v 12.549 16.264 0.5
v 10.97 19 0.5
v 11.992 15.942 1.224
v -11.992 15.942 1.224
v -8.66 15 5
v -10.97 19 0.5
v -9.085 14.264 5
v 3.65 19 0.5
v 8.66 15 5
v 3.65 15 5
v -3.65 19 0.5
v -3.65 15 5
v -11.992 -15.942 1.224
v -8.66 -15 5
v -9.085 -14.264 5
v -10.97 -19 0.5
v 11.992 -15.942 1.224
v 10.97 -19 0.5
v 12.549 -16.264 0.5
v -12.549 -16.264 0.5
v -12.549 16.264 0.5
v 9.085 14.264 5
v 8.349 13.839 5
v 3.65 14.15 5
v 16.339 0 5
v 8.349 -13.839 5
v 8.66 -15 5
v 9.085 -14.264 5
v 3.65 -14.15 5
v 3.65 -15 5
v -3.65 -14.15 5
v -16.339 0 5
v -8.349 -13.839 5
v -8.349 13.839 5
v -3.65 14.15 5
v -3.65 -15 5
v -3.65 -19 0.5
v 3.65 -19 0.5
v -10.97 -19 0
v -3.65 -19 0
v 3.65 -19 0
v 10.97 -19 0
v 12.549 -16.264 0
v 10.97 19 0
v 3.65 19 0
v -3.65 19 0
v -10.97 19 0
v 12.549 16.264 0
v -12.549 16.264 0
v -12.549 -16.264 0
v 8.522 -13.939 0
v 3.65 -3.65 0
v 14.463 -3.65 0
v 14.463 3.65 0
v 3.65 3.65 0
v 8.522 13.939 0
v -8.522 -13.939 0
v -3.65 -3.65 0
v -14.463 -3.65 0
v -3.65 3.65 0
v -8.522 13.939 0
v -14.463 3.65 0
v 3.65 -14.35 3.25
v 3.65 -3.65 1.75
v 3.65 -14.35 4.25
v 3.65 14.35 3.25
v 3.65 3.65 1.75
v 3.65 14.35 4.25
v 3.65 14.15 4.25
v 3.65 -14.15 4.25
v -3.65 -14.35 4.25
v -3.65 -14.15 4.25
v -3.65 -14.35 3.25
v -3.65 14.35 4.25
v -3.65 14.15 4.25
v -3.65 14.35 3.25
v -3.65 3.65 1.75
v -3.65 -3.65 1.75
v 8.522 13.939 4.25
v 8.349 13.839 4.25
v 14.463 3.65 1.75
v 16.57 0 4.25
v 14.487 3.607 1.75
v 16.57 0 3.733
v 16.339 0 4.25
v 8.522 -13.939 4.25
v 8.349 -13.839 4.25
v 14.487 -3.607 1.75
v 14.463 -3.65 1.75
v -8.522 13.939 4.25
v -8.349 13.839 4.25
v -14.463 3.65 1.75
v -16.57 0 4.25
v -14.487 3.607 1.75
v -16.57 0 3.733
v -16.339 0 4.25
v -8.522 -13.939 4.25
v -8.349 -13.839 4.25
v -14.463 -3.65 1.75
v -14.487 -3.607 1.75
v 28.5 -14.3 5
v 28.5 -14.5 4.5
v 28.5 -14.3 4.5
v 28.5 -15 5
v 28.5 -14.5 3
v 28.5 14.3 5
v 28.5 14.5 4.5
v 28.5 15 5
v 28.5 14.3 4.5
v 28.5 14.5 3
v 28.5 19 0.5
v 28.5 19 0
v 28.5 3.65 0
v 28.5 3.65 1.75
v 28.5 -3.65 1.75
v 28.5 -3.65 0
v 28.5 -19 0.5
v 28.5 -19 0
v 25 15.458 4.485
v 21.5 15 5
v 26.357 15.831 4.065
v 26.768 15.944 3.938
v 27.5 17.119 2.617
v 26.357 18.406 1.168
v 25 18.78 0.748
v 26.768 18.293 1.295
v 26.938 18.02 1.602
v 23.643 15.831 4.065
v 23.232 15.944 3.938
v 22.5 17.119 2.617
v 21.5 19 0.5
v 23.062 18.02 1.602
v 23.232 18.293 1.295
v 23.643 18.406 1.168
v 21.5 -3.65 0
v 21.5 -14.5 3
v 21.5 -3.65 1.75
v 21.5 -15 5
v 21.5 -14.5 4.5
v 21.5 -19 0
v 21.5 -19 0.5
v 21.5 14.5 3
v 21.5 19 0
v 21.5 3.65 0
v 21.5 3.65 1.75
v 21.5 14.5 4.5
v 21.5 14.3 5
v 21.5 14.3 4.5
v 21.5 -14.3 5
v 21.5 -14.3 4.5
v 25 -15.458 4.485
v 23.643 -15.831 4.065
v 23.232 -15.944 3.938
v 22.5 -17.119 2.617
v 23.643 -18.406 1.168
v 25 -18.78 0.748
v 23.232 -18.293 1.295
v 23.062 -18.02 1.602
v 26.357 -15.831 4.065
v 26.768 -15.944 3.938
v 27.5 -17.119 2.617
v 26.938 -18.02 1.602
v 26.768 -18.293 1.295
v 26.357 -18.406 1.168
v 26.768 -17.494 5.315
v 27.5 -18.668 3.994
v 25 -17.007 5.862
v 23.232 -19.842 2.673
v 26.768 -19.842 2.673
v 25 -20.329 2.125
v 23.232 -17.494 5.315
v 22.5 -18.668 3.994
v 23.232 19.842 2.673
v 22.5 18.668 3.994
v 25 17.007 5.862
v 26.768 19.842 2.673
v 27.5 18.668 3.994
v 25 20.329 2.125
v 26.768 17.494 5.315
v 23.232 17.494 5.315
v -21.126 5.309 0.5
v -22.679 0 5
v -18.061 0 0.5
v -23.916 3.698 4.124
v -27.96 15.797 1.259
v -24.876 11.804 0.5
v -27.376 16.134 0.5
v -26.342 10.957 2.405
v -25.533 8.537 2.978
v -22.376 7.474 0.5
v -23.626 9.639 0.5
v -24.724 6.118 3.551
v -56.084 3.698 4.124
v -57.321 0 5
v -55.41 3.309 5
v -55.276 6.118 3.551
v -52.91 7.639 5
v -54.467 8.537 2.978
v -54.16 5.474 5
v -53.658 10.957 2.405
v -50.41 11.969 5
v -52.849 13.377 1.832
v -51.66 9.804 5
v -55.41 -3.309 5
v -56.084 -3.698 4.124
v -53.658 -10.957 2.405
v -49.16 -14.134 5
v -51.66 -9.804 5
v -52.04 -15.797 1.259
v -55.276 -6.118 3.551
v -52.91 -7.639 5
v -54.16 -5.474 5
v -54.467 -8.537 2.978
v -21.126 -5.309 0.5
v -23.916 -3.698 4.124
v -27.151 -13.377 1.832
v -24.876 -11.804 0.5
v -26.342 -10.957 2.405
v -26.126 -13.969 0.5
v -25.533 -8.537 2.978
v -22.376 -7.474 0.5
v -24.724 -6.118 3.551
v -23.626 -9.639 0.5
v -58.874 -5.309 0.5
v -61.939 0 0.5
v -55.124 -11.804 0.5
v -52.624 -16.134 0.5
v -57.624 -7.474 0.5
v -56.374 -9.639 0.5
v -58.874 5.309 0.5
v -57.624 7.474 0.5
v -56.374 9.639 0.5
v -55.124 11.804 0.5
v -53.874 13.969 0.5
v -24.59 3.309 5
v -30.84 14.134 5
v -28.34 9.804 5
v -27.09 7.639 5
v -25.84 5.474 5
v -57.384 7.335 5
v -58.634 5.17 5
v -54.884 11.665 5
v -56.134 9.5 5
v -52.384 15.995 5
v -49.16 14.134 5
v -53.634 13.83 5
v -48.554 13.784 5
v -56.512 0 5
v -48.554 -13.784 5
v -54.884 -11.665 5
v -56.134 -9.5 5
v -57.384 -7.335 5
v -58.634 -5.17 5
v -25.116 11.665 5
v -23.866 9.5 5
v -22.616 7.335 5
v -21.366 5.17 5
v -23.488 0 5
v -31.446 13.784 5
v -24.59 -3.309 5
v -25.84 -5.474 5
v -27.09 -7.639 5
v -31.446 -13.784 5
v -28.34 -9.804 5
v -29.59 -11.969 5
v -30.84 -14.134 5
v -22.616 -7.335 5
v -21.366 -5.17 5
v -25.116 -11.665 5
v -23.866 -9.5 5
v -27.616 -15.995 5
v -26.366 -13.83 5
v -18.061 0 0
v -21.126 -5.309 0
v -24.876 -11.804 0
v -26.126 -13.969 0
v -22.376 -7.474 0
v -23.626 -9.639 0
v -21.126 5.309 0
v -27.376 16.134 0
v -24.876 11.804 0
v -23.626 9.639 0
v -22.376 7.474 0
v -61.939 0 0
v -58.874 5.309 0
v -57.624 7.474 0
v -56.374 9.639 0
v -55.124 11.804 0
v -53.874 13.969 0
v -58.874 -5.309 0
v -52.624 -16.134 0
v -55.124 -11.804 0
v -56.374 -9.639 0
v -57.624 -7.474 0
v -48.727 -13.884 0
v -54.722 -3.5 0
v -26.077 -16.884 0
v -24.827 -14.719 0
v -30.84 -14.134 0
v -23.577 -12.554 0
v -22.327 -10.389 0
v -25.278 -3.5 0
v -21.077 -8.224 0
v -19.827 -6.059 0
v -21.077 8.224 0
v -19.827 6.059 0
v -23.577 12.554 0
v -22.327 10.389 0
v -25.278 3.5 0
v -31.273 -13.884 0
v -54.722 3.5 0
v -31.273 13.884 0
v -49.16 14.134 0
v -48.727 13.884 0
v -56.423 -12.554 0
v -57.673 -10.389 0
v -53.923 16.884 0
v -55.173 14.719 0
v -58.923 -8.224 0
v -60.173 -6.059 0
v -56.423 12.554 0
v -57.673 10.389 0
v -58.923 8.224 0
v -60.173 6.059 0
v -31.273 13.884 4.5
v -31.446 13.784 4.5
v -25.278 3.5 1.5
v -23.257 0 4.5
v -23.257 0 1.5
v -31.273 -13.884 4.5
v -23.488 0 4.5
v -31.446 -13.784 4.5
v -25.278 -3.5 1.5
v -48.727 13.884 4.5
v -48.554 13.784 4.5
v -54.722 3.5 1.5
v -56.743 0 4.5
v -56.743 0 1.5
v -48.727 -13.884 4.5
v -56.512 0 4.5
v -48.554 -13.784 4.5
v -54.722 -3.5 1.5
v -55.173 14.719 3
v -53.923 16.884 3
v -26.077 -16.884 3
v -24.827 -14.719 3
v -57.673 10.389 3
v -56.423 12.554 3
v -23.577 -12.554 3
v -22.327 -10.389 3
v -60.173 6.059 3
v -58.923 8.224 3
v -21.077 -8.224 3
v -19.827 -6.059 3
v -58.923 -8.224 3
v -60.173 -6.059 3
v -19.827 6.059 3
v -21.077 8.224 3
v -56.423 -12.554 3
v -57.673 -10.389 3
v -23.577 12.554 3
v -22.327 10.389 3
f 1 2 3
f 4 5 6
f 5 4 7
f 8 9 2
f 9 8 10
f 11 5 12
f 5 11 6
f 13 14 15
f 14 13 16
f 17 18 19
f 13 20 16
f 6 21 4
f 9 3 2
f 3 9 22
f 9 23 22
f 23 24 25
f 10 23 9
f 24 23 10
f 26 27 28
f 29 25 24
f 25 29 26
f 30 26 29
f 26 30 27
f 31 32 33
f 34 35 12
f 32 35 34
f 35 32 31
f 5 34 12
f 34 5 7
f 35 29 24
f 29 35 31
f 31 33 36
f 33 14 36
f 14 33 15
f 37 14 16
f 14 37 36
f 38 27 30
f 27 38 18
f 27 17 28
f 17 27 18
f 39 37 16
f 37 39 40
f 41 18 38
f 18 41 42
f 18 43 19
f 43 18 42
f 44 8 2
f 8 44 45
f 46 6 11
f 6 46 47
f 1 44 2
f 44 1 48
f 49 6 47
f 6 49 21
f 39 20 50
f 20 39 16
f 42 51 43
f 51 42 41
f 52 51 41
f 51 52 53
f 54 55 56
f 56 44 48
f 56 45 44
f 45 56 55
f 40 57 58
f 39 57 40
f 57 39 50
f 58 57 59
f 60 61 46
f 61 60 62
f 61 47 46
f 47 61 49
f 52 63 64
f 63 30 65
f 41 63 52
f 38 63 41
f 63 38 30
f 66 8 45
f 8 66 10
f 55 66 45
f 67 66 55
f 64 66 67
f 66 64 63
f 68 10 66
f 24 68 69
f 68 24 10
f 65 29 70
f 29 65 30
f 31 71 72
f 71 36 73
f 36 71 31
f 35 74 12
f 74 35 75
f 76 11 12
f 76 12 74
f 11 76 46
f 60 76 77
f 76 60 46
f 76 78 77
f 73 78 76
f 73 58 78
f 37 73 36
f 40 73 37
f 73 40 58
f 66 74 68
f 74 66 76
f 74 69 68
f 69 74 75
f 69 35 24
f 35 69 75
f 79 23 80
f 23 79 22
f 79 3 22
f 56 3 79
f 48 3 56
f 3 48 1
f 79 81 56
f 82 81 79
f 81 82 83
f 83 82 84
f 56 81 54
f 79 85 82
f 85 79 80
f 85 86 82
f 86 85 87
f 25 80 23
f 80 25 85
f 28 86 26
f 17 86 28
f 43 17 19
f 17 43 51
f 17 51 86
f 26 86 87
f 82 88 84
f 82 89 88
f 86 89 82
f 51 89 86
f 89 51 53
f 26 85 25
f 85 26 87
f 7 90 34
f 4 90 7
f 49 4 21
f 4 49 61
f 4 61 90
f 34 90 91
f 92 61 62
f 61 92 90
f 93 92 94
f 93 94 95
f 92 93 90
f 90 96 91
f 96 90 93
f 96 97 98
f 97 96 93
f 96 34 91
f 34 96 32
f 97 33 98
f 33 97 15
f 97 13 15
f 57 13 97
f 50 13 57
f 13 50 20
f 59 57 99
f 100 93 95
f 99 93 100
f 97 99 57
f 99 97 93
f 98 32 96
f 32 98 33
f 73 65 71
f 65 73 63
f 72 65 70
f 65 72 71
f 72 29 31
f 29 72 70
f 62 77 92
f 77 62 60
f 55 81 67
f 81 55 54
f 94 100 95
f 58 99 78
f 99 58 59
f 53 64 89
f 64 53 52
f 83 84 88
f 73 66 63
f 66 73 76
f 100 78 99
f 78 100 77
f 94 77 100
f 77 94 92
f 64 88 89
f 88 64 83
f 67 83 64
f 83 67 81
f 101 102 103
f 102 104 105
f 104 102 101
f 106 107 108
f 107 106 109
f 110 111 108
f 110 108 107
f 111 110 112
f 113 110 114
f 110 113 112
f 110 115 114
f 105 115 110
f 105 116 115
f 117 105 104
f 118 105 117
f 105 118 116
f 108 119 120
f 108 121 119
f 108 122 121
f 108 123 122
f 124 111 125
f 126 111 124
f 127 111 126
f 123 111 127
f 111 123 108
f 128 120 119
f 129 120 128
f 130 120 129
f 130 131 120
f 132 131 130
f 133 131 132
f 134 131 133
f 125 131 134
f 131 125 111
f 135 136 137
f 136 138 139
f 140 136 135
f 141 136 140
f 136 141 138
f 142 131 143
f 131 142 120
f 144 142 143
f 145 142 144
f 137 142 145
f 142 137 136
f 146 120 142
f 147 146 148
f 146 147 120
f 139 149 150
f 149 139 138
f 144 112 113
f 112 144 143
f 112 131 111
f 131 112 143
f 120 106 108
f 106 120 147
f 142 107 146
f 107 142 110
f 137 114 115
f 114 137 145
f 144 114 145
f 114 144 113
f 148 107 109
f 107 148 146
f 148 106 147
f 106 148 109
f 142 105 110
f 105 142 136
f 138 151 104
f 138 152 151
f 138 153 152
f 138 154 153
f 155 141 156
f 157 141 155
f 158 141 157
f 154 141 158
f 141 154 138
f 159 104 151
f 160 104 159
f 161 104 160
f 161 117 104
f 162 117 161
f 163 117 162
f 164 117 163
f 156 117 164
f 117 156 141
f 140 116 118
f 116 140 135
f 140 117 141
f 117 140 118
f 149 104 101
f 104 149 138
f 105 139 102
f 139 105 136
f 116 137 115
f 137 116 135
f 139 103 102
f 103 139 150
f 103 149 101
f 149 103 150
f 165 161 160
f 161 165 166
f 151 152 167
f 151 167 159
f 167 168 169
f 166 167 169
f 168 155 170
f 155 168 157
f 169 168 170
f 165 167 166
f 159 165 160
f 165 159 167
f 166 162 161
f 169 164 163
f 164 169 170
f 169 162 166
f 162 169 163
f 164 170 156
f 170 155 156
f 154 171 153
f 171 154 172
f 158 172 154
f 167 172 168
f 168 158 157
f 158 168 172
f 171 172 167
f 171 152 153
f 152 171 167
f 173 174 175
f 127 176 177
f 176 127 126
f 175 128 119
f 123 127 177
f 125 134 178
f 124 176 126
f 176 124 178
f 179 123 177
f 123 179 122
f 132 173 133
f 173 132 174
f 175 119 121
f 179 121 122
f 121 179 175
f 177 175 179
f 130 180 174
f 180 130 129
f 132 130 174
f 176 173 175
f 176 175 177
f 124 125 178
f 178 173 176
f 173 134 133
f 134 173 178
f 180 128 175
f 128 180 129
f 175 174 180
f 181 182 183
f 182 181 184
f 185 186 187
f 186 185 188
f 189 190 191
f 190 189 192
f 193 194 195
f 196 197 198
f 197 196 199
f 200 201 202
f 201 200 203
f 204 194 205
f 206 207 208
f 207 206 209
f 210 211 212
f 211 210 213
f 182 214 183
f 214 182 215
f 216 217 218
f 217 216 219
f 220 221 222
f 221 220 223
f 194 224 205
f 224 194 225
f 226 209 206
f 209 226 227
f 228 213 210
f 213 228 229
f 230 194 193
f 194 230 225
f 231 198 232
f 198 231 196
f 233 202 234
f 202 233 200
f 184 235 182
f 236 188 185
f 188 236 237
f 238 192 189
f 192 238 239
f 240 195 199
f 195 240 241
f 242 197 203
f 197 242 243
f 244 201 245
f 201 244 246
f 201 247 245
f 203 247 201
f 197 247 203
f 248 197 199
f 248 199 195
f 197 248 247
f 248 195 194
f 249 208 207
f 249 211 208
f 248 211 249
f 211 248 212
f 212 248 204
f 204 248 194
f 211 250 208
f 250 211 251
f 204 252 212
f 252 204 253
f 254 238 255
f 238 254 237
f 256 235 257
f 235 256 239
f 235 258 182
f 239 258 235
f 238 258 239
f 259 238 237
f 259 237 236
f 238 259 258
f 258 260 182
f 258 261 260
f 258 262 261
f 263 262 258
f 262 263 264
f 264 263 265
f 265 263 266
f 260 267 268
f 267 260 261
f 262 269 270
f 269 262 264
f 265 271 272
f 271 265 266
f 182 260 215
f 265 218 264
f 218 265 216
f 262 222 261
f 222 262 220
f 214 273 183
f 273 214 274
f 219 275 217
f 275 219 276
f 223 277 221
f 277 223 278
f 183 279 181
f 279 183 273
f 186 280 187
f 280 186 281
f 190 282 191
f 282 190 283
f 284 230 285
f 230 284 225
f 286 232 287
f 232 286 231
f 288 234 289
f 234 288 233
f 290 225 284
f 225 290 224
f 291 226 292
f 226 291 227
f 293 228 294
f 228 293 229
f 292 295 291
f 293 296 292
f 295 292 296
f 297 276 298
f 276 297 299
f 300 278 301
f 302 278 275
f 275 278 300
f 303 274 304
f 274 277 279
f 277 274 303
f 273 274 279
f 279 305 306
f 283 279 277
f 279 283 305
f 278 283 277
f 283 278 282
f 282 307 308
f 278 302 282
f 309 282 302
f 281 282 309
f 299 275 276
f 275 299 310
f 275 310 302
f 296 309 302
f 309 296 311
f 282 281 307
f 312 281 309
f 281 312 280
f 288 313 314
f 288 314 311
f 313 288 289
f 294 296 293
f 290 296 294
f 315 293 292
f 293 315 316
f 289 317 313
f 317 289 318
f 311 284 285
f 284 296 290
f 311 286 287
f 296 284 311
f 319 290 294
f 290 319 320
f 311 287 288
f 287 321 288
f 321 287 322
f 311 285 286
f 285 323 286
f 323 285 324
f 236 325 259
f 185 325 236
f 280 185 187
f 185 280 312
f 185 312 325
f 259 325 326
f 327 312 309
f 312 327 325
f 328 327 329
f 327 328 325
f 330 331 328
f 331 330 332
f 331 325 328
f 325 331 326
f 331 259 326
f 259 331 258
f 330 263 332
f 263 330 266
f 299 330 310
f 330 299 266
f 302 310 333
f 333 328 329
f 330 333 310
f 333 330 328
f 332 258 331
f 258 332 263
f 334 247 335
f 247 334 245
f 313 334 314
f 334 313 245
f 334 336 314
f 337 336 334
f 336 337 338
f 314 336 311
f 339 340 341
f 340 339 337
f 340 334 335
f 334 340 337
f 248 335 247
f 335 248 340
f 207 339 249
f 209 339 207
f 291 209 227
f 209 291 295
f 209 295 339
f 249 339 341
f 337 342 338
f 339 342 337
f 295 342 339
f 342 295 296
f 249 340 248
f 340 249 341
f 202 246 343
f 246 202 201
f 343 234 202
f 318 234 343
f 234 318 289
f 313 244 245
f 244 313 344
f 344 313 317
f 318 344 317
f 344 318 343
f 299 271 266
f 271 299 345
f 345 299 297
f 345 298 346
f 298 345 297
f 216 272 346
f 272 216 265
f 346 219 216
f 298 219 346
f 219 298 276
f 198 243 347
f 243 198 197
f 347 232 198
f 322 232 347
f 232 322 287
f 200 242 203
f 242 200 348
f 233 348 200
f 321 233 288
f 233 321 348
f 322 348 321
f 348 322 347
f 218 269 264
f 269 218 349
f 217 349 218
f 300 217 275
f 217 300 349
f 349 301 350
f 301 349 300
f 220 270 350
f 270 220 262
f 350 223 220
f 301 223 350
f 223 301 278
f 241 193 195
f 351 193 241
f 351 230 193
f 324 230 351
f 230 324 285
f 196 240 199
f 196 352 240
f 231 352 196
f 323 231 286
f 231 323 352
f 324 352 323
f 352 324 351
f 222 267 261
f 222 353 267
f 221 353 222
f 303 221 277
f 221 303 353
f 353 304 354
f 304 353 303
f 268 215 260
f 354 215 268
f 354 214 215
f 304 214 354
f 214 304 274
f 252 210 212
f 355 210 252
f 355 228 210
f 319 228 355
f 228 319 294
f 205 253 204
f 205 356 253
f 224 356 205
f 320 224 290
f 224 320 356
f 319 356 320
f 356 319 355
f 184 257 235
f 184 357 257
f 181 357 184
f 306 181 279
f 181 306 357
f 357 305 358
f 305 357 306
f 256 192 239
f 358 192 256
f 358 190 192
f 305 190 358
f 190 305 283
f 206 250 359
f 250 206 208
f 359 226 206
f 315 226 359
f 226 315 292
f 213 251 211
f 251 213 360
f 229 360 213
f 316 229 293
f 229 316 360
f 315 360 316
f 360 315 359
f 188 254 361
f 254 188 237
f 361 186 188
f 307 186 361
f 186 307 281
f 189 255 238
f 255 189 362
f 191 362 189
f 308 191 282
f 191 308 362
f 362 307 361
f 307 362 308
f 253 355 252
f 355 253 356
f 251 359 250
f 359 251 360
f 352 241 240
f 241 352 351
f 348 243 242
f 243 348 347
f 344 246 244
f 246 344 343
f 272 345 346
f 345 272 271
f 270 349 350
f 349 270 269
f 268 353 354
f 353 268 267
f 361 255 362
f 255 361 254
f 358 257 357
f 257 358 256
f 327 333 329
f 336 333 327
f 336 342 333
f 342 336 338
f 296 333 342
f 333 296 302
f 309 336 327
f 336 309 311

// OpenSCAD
//All our base are belong to us

/* [Basic] */

//Parts to Print
selectedParts = 4; //[1: Base Only, 2: Ability Clip, 3: Level Clip, 4: Base and Clip(s)]

//Size of the bottom of the top of the Base (flat side to flat side)
topBaseWidth = 30;

//Size of the bottom of the base
baseEdgeWidth = 4;  //DEV/BUG edge width cannot be less than 5, fix this

//Thickness of the base
baseHeight = 5; //Must be greater than 5

ability = "Sneak";  //[Range, Basic, Sneak]

level = 5; //Max 6

/* [Advanced] */

//Width of the Symbol Clip
symbolClipWidth = 7;
symbolHeight = 2.7;  // DEV/BUG - Issues with changing this need to parameticize the callign function

//Distance from the corner of the top hex the symbol clip starts
levelClipOffset = 1;

clipTolerance = .15;  //Horizontal Tolerance
clipVerticalTolerance = .25;
clipBandHeight = 1.5;

levelSymbolWidth = 2.5;  //This is not 100% parametricized
levelSymbolSpacing = 2.5;  //This is not 100% parametricized
levelSymbolOverhang = 1.5; //How much the level symbols stick out from the base.

lipHeight = .5;
lipOverhang = .2;

/* [Hidden] */

bottomBaseWidth = topBaseWidth + baseEdgeWidth*2;

dochTop = 2 * topBaseWidth / sqrt(3); //diameter of circle around Hex (DOCH)
dochBottom = 2 * bottomBaseWidth / sqrt(3); //diameter of circle around Hex (DOCH)
topHexSideLen = topBaseWidth / sqrt(3); //Length of the top Hex's side

edgeAngle = atan2(baseHeight-.5,baseEdgeWidth);

//*** Main ****

if(selectedParts == 4 || selectedParts == 1)
{
        
    //Main Base
    difference()
    {
        
        union()
        {
            translate([0,0,.5])
                cylinder(h=baseHeight-.5, r2=dochTop/2, r1=dochBottom/2,  $fn = 6);
                cylinder(h=.5, r=dochBottom/2,  $fn = 6);
        }
        //Material Removeal
        
            //Symbol Clip Area Removal 
            
            translate([-(symbolClipWidth+clipTolerance*2)/2, topBaseWidth/2-clipTolerance, 0])
                cube([symbolClipWidth+clipTolerance*2 , baseEdgeWidth+clipTolerance, baseHeight]);
            translate([-(symbolClipWidth+clipTolerance*2)/2,-topBaseWidth/2,0])
                cube([symbolClipWidth+clipTolerance*2, clipTolerance+.5, baseHeight]);
            //Lip 
            translate([-(symbolClipWidth+clipTolerance*2)/2, -topBaseWidth/2+.5, baseHeight-lipHeight-clipVerticalTolerance])     
                cube([symbolClipWidth+clipTolerance*2, lipOverhang+clipTolerance, lipHeight+clipVerticalTolerance]);
            
            mirror([0,1,0])
            {
                translate([-(symbolClipWidth+clipTolerance*2)/2, topBaseWidth/2-clipTolerance, 0])
                    cube([symbolClipWidth+clipTolerance*2 , baseEdgeWidth+clipTolerance, baseHeight]);
                translate([-(symbolClipWidth+clipTolerance*2)/2,-topBaseWidth/2,0])
                cube([symbolClipWidth+clipTolerance*2, clipTolerance+.5, baseHeight]);
                //Lip 
                translate([-symbolClipWidth/2, -topBaseWidth/2+.5, baseHeight-lipHeight])     
                    cube([symbolClipWidth, lipOverhang, lipHeight]);
                  //Lip 
                translate([-(symbolClipWidth+clipTolerance*2)/2, -topBaseWidth/2+.5, baseHeight-lipHeight-clipVerticalTolerance])     
                    cube([symbolClipWidth+clipTolerance*2, lipOverhang+clipTolerance, lipHeight+clipVerticalTolerance]);
            }
            
            //Level Clip Area Removal 
            
            union()  //DEV/BUG  this uses an arbitrary value to remove extra material see ".6"
            {
                rotate([0,0,-60])
                    union()
                    {
                        //Polygon Plus .5 Side Thickening cube
                        translate([-((topHexSideLen+clipTolerance*2)/2-levelClipOffset), topBaseWidth/2-(clipTolerance+.5), 0])
                            cube([topHexSideLen+baseEdgeWidth, baseEdgeWidth+clipTolerance+.6, baseHeight]);
                        //Lip 
                        translate([-((topHexSideLen+clipTolerance*2)/2-levelClipOffset), topBaseWidth/2-(.5+lipOverhang+clipTolerance), baseHeight-lipHeight-clipVerticalTolerance])     
                            cube([topHexSideLen-levelClipOffset, lipOverhang+clipTolerance, lipHeight+clipVerticalTolerance]);
                    }
                    
                mirror([0,1,0])
                    rotate([0,0,-60])
                        union()
                        {
                            //Polygon Plus .5 Side Thickening cube
                            translate([-((topHexSideLen+clipTolerance*2)/2-levelClipOffset), topBaseWidth/2-(clipTolerance+.5), 0])
                                cube([topHexSideLen+baseEdgeWidth, baseEdgeWidth+clipTolerance+.6, baseHeight]);
                            //Lip 
                            translate([-((topHexSideLen+clipTolerance*2)/2-levelClipOffset), topBaseWidth/2-(.5+lipOverhang+clipTolerance), baseHeight-lipHeight-clipVerticalTolerance])     
                                cube([topHexSideLen-levelClipOffset, lipOverhang+clipTolerance, lipHeight+clipVerticalTolerance]);
                        }  
                        
                mirror([1,0,0])
                    rotate([0,0,-60])
                        union()
                        {
                            //Polygon Plus .5 Side Thickening cube
                            translate([-((topHexSideLen+clipTolerance*2)/2-levelClipOffset), topBaseWidth/2-(clipTolerance+.5), 0])
                                cube([topHexSideLen+baseEdgeWidth, baseEdgeWidth+clipTolerance+.6, baseHeight]);
                            //Lip 
                            translate([-((topHexSideLen+clipTolerance*2)/2-levelClipOffset), topBaseWidth/2-(.5+lipOverhang+clipTolerance), baseHeight-lipHeight-clipVerticalTolerance])     
                                cube([topHexSideLen-levelClipOffset, lipOverhang+clipTolerance, lipHeight+clipVerticalTolerance]);
                        }  
                        
                mirror([1,0,0])        
                    mirror([0,1,0])
                        rotate([0,0,-60])
                            union()
                            {
                                //Polygon Plus .5 Side Thickening cube
                                translate([-((topHexSideLen+clipTolerance*2)/2-levelClipOffset), topBaseWidth/2-(clipTolerance+.5), 0])
                                    cube([topHexSideLen+baseEdgeWidth, baseEdgeWidth+clipTolerance+.6, baseHeight]);
                                //Lip 
                                translate([-((topHexSideLen+clipTolerance*2)/2-levelClipOffset), topBaseWidth/2-(.5+lipOverhang+clipTolerance), baseHeight-lipHeight-clipVerticalTolerance])     
                                    cube([topHexSideLen-levelClipOffset, lipOverhang+clipTolerance, lipHeight+clipVerticalTolerance]);
                            }  
            }
            
            //Material Removal to help droopy corners at Level Clip edge
            //DEV/BUG - This is not parametric.
            rotate([0,0,90])
                translate([-(symbolClipWidth/2+clipTolerance), topBaseWidth/2-baseEdgeWidth/2-clipTolerance-.2, 0])
                    prism(symbolClipWidth+clipTolerance*2, baseEdgeWidth+.2, baseHeight-1); 
                    
            rotate([0,0,-90])
                translate([-(symbolClipWidth/2+clipTolerance), topBaseWidth/2-baseEdgeWidth/2-clipTolerance-.2, 0])
                    prism(symbolClipWidth+clipTolerance*2, baseEdgeWidth+.2, baseHeight-1); 
            
            
            //Symbol Clip Bands Removal
            translate([-(symbolClipWidth+clipTolerance*2)/2, -bottomBaseWidth/2, 0])
                cube([symbolClipWidth+clipTolerance*2, bottomBaseWidth, clipBandHeight*2 + clipVerticalTolerance]);
                
            rotate([0,0,90])
                translate([-(symbolClipWidth+clipTolerance*2)/2, -bottomBaseWidth/2, 0])
                cube([symbolClipWidth+clipTolerance*2, bottomBaseWidth, clipBandHeight + clipVerticalTolerance]);
                
    }
}


if(selectedParts == 4 || selectedParts == 2)
{

    //Symbol Clip
    translate([25,0,0]) //DEV/BUG - Parametric This
    {
       //Clip Band
        translate([-(symbolClipWidth)/2, -topBaseWidth/2, clipBandHeight+clipVerticalTolerance])
            cube([symbolClipWidth, topBaseWidth, clipBandHeight-clipVerticalTolerance]);
        
        //Clip Sides
        translate([-symbolClipWidth/2, -bottomBaseWidth/2, .5])
            prism(symbolClipWidth, baseEdgeWidth, baseHeight-.5); 
        translate([-symbolClipWidth/2, -bottomBaseWidth/2, 0])
            cube([symbolClipWidth, baseEdgeWidth, .5]);
        translate([-symbolClipWidth/2,-topBaseWidth/2,0])
            cube([symbolClipWidth, .5, baseHeight]);
        translate([-symbolClipWidth/2,-topBaseWidth/2,0])
            cube([symbolClipWidth, topBaseWidth/2-symbolClipWidth/2-clipTolerance, clipBandHeight+clipVerticalTolerance]);
        //Lip 
        translate([-symbolClipWidth/2, -topBaseWidth/2+.5, baseHeight-lipHeight])     
            cube([symbolClipWidth, lipOverhang, lipHeight]);
        
        mirror([0,1,0])
        {
            translate([-symbolClipWidth/2, -bottomBaseWidth/2, .5])
                prism(symbolClipWidth, baseEdgeWidth, baseHeight-.5); 
            translate([-symbolClipWidth/2, -bottomBaseWidth/2, 0])
                cube([symbolClipWidth, baseEdgeWidth, .5]);
            translate([-symbolClipWidth/2,-topBaseWidth/2,0])
                cube([symbolClipWidth, .5, baseHeight]);
            translate([-symbolClipWidth/2,-topBaseWidth/2,0])
                cube([symbolClipWidth, topBaseWidth/2-symbolClipWidth/2-clipTolerance, clipBandHeight+clipVerticalTolerance]); 
            //Lip 
            translate([-symbolClipWidth/2, -topBaseWidth/2+.5, baseHeight-lipHeight])     
                cube([symbolClipWidth, lipOverhang, lipHeight]);
        }
        
        // clipSymbol
        //DEV/BUG edge width cannot be less than 5, fix this... Make this more parametric... Need to fix angle and height
     
        translate([0, -bottomBaseWidth/2+symbolHeight/2+1, symbolHeight-.5])
            rotate([edgeAngle,0,0])
                abilitySymbol(symbolClipWidth-2, symbolHeight, ability);
        
        mirror([0,1,0])
            translate([0, -bottomBaseWidth/2+symbolHeight/2+1, symbolHeight-.5])
                rotate([edgeAngle,0,0])
                    abilitySymbol(symbolClipWidth-2, symbolHeight, ability);
    } 
    
}


if(selectedParts == 4 || selectedParts == 3)
{
    //Level Clip       
    translate([-40,0,0]) //DEV/BUG Parametric This
    {
        //Clip Band
        rotate([0,0,90])
            translate([-(symbolClipWidth)/2, -dochTop/2, 0])
                cube([symbolClipWidth, dochTop, clipBandHeight]);
   
        //Clip Sides
        intersection()
        {
            union()
            {
                translate([0,0,.5])
                    cylinder(h=baseHeight-.5, r2=dochTop/2, r1=dochBottom/2,  $fn = 6);
                cylinder(h=.5, r=dochBottom/2,  $fn = 6);
            }
            
            union()
            {
           
                          
                rotate([0,0,-60])
                    union()
                    {
                        //Thicken side poly
                        translate([-(topHexSideLen/2-levelClipOffset), topBaseWidth/2-.5, 0])
                            cube([topHexSideLen+baseEdgeWidth, baseEdgeWidth+.5, baseHeight]);
                        //Lip 
                        translate([-(topHexSideLen/2-levelClipOffset), topBaseWidth/2-(.5+lipOverhang), baseHeight-lipHeight])     
                            cube([topHexSideLen-levelClipOffset, lipOverhang, lipHeight]);
                     }
               
                mirror([0,1,0])
                    rotate([0,0,-60])
                        union()
                        {
                            //Thicken side poly
                            translate([-(topHexSideLen/2-levelClipOffset), topBaseWidth/2-.5, 0])
                                cube([topHexSideLen+baseEdgeWidth, baseEdgeWidth+.5, baseHeight]);
                        
                            //Lip
                            translate([-(topHexSideLen/2-levelClipOffset), topBaseWidth/2-(.5+lipOverhang), baseHeight-lipHeight])     
                                cube([topHexSideLen-levelClipOffset, lipOverhang, lipHeight]);
                        }
                            
                            
                mirror([1,0,0])
                    rotate([0,0,-60])
                    union()
                    {
                        //Thicken side poly
                        translate([-(topHexSideLen/2-levelClipOffset), topBaseWidth/2-.5, 0])
                            cube([topHexSideLen+baseEdgeWidth, baseEdgeWidth+.5, baseHeight]);
                        //Lip 
                        translate([-(topHexSideLen/2-levelClipOffset), topBaseWidth/2-(.5+lipOverhang), baseHeight-lipHeight])     
                            cube([topHexSideLen-levelClipOffset, lipOverhang, lipHeight]);
                     }
                     
                mirror([1,0,0])        
                    mirror([0,1,0])
                        rotate([0,0,-60])
                             union()
                            {
                                //Thicken side poly
                                translate([-(topHexSideLen/2-levelClipOffset), topBaseWidth/2-.5, 0])
                                    cube([topHexSideLen+baseEdgeWidth, baseEdgeWidth+.5, baseHeight]);
                                //Lip 
                                translate([-(topHexSideLen/2-levelClipOffset), topBaseWidth/2-(.5+lipOverhang), baseHeight-lipHeight])     
                                    cube([topHexSideLen-levelClipOffset, lipOverhang, lipHeight]);
                             }
                
                }
            }
            
            //Level Symbols
            levelStartLoc=-(topHexSideLen/2-levelClipOffset);
            levelLocInc=levelSymbolSpacing+levelSymbolWidth;
            
           
            //DEV/BUG This is not 100% parametric

        difference()
        {
            union()
            {
                if(level >= 1)
                {
                
                    rotate([0,0,-120])
                        translate([levelStartLoc,-(bottomBaseWidth/2+levelSymbolOverhang),0])
                            cube([levelSymbolWidth, baseEdgeWidth+levelSymbolOverhang, baseHeight]);
                    
                    mirror([1,0,0])mirror([0,1,0])
                        rotate([0,0,-120])
                            translate([levelStartLoc,-(bottomBaseWidth/2+levelSymbolOverhang),0])
                                cube([levelSymbolWidth, baseEdgeWidth+levelSymbolOverhang, baseHeight]);
                }
                
                if(level >= 2)
                {
                    rotate([0,0,-120])
                        translate([levelStartLoc+levelLocInc,-(bottomBaseWidth/2+levelSymbolOverhang),0])
                            cube([levelSymbolWidth, baseEdgeWidth+levelSymbolOverhang, baseHeight]);
                    
                    mirror([1,0,0])mirror([0,1,0])
                        rotate([0,0,-120])
                            translate([levelStartLoc+levelLocInc,-(bottomBaseWidth/2+levelSymbolOverhang),0])
                                cube([levelSymbolWidth, baseEdgeWidth+levelSymbolOverhang, baseHeight]);
                }
                
                if(level >= 3)
                {
                
                    rotate([0,0,-120])
                        translate([levelStartLoc+levelLocInc*2,-(bottomBaseWidth/2+levelSymbolOverhang),0])
                            cube([levelSymbolWidth, baseEdgeWidth+levelSymbolOverhang, baseHeight]);
                    
                    mirror([1,0,0])mirror([0,1,0])
                        rotate([0,0,-120])
                            translate([levelStartLoc+levelLocInc*2,-(bottomBaseWidth/2+levelSymbolOverhang),0])
                                cube([levelSymbolWidth, baseEdgeWidth+levelSymbolOverhang, baseHeight]);
                }
                
                if(level >= 4)
                {
                
                    rotate([0,0,-60])
                        translate([-(levelStartLoc+levelLocInc*2+levelSymbolWidth),-(bottomBaseWidth/2+levelSymbolOverhang),0])
                            cube([levelSymbolWidth, baseEdgeWidth+levelSymbolOverhang, baseHeight]);
                    
                    mirror([1,0,0])mirror([0,1,0])
                        rotate([0,0,-60])
                            translate([-(levelStartLoc+levelLocInc*2+levelSymbolWidth),-(bottomBaseWidth/2+levelSymbolOverhang),0])
                                cube([levelSymbolWidth, baseEdgeWidth+levelSymbolOverhang, baseHeight]);
                }
                
                if(level >= 5)
                {
                
                    rotate([0,0,-60])
                        translate([-(levelStartLoc+levelLocInc+levelSymbolWidth),-(bottomBaseWidth/2+levelSymbolOverhang),0])
                            cube([levelSymbolWidth, baseEdgeWidth+levelSymbolOverhang, baseHeight]);
                    
                    mirror([1,0,0])mirror([0,1,0])
                        rotate([0,0,-60])
                            translate([-(levelStartLoc+levelLocInc+levelSymbolWidth),-(bottomBaseWidth/2+levelSymbolOverhang),0])
                                cube([levelSymbolWidth, baseEdgeWidth+levelSymbolOverhang, baseHeight]);
                }
                
                if(level >= 6)
                {
                
                    rotate([0,0,-60])
                        translate([-(levelStartLoc+levelSymbolWidth),-(bottomBaseWidth/2+levelSymbolOverhang),0])
                            cube([levelSymbolWidth, baseEdgeWidth+levelSymbolOverhang, baseHeight]);
                    
                    mirror([1,0,0])mirror([0,1,0])
                        rotate([0,0,-60])
                            translate([-(levelStartLoc+levelSymbolWidth),-(bottomBaseWidth/2+levelSymbolOverhang),0])
                                cube([levelSymbolWidth, baseEdgeWidth+levelSymbolOverhang, baseHeight]);
                }
                
                
                
            }  //end of union
            
            union()
            {
           
                //Blocks to remove the corners of the level pieces. 
               
                
                //Dev-Bug may need to make this more parametric
                rotate([0,0,-60])
                        translate([-topHexSideLen/2, -(topBaseWidth/2+baseEdgeWidth+levelSymbolOverhang), baseHeight/2+.5])
                            rotate([edgeAngle,0,0])
                                cube([topHexSideLen, baseEdgeWidth, baseHeight/2]);
               
                 rotate([0,0,-120])
                        translate([-topHexSideLen/2, -(topBaseWidth/2+baseEdgeWidth+levelSymbolOverhang), baseHeight/2+.5])
                            rotate([edgeAngle,0,0])
                                cube([topHexSideLen, baseEdgeWidth, baseHeight/2]);
               
                rotate([0,0,60])
                        translate([-topHexSideLen/2, -(topBaseWidth/2+baseEdgeWidth+levelSymbolOverhang), baseHeight/2+.5])
                            rotate([edgeAngle,0,0])
                                cube([topHexSideLen, baseEdgeWidth, baseHeight/2]);
               
                rotate([0,0,120])
                        translate([-topHexSideLen/2, -(topBaseWidth/2+baseEdgeWidth+levelSymbolOverhang), baseHeight/2+.5])
                            rotate([edgeAngle,0,0])
                                cube([topHexSideLen, baseEdgeWidth, baseHeight/2]);
                
            }
            
            
            
            
            
        }  //end of difference
    }
}



//*** Modules ****
module prism(l, w, h)
{
       polyhedron(
               points=[[0,0,0], [l,0,0], [l,w,0], [0,w,0], [0,w,h], [l,w,h]],
               faces=[[0,1,2,3],[5,4,3,2],[0,4,5,1],[0,3,4],[5,2,1]]
               );
}

module abilitySymbol(abilitySize, abilityHeight, ability)
{
    echo("Ability Symbol Size =", abilitySize);
    
    //Range - Triangle
    if(ability == "Range")   
            linear_extrude(height=abilityHeight)
                polygon([[-abilitySize/2,-abilitySize/2],[0,abilitySize/2],[abilitySize/2,-abilitySize/2]]);

    //Direct - Square
    if(ability == "Basic")
        translate([0, 0, abilityHeight/2])  //setting cube to be center set and start at Z=0
            cube([abilitySize, abilitySize, abilityHeight], center=true);

    //Sneak - Circle
    if(ability == "Sneak")
       cylinder(h=abilityHeight,r=abilitySize/2);
    
  
       
}
